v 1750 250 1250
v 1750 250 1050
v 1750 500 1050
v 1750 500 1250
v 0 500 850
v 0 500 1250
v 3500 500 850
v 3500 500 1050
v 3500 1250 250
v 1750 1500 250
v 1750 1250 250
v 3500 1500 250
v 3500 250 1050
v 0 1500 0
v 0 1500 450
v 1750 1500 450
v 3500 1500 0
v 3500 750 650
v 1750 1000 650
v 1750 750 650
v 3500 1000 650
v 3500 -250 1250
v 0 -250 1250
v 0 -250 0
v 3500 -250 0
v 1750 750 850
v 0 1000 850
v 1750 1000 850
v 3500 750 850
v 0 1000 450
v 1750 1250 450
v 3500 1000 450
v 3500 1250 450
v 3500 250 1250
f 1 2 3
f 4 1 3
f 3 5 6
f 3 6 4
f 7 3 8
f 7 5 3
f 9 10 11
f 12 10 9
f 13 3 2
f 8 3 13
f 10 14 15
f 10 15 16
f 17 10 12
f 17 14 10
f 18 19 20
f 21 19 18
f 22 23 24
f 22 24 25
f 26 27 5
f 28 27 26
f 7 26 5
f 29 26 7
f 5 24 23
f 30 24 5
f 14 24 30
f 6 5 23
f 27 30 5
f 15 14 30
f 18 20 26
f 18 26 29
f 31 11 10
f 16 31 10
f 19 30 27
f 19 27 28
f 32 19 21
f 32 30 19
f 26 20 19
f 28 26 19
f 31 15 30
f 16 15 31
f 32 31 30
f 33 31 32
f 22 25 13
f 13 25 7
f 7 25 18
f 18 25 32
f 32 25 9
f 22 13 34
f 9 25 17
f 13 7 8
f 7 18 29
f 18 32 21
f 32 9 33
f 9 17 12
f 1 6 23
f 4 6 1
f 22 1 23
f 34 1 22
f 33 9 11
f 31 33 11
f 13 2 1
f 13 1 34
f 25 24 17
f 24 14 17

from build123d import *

# Parameters (mm, degrees)
F0_W      = 3500
F0_H      = 1500
F1_DEPTH  = 250
F2_W      = 1750
F2_H      = 250
F3_DEPTH  = 200
F4_W      = 1750
F4_H      = 250
F5_DEPTH  = 800
F6_W      = 1750
F6_H      = 250
F7_DEPTH  = 600
F8_W      = 1750
F8_H      = 250
F9_DEPTH  = 400
F10_W     = 1750
F10_H     = 250
F11_DEPTH = 200
F13_W     = 3500
F13_H     = 1250
F14_DEPTH = 250


with BuildPart() as f1:
    # F0 (on Top) → F1 (new body)
    with BuildSketch(Plane.XY):
        with Locations((1750, 750)):
            Rectangle(F0_W, F0_H)
    extrude(amount=F1_DEPTH)

    # F2 (on face) → F3 (join)
    with BuildSketch(Plane.XY.offset(250)):
        Polygon((0, 1250), (0, 0), (3500, 0), (3500, 1250), (1750, 1250), align=None)
        with Locations((875, 1375)):
            Rectangle(F2_W, F2_H)
    extrude(amount=F3_DEPTH)

    # F4 (on face) → F5 (join)
    with BuildSketch(Plane.XY.offset(450)):
        Polygon((0, 500), (0, 0), (1750, 0), (1750, 250), (1750, 500), align=None)
        with Locations((2625, 125)):
            Rectangle(F4_W, F4_H)
    extrude(amount=F5_DEPTH)

    # F6 (on face) → F7 (join)
    with BuildSketch(Plane.XY.offset(450)):
        with Locations((2625, 375)):
            Rectangle(F6_W, F6_H)
    extrude(amount=F7_DEPTH)

    # F8 (on face) → F9 (join)
    with BuildSketch(Plane.XY.offset(450)):
        Polygon((1750, 1000), (0, 1000), (0, 500), (1750, 500), (1750, 750), align=None)
        with Locations((2625, 625)):
            Rectangle(F8_W, F8_H)
    extrude(amount=F9_DEPTH)

    # F10 (on face) → F11 (join)
    with BuildSketch(Plane.XY.offset(450)):
        with Locations((2625, 875)):
            Rectangle(F10_W, F10_H)
    extrude(amount=F11_DEPTH)

    # F13 (on face) → F14 (join)
    with BuildSketch(Plane.XZ):
        with Locations((1750, 625)):
            Rectangle(F13_W, F13_H)
    extrude(amount=F14_DEPTH)


solid = f1.part
